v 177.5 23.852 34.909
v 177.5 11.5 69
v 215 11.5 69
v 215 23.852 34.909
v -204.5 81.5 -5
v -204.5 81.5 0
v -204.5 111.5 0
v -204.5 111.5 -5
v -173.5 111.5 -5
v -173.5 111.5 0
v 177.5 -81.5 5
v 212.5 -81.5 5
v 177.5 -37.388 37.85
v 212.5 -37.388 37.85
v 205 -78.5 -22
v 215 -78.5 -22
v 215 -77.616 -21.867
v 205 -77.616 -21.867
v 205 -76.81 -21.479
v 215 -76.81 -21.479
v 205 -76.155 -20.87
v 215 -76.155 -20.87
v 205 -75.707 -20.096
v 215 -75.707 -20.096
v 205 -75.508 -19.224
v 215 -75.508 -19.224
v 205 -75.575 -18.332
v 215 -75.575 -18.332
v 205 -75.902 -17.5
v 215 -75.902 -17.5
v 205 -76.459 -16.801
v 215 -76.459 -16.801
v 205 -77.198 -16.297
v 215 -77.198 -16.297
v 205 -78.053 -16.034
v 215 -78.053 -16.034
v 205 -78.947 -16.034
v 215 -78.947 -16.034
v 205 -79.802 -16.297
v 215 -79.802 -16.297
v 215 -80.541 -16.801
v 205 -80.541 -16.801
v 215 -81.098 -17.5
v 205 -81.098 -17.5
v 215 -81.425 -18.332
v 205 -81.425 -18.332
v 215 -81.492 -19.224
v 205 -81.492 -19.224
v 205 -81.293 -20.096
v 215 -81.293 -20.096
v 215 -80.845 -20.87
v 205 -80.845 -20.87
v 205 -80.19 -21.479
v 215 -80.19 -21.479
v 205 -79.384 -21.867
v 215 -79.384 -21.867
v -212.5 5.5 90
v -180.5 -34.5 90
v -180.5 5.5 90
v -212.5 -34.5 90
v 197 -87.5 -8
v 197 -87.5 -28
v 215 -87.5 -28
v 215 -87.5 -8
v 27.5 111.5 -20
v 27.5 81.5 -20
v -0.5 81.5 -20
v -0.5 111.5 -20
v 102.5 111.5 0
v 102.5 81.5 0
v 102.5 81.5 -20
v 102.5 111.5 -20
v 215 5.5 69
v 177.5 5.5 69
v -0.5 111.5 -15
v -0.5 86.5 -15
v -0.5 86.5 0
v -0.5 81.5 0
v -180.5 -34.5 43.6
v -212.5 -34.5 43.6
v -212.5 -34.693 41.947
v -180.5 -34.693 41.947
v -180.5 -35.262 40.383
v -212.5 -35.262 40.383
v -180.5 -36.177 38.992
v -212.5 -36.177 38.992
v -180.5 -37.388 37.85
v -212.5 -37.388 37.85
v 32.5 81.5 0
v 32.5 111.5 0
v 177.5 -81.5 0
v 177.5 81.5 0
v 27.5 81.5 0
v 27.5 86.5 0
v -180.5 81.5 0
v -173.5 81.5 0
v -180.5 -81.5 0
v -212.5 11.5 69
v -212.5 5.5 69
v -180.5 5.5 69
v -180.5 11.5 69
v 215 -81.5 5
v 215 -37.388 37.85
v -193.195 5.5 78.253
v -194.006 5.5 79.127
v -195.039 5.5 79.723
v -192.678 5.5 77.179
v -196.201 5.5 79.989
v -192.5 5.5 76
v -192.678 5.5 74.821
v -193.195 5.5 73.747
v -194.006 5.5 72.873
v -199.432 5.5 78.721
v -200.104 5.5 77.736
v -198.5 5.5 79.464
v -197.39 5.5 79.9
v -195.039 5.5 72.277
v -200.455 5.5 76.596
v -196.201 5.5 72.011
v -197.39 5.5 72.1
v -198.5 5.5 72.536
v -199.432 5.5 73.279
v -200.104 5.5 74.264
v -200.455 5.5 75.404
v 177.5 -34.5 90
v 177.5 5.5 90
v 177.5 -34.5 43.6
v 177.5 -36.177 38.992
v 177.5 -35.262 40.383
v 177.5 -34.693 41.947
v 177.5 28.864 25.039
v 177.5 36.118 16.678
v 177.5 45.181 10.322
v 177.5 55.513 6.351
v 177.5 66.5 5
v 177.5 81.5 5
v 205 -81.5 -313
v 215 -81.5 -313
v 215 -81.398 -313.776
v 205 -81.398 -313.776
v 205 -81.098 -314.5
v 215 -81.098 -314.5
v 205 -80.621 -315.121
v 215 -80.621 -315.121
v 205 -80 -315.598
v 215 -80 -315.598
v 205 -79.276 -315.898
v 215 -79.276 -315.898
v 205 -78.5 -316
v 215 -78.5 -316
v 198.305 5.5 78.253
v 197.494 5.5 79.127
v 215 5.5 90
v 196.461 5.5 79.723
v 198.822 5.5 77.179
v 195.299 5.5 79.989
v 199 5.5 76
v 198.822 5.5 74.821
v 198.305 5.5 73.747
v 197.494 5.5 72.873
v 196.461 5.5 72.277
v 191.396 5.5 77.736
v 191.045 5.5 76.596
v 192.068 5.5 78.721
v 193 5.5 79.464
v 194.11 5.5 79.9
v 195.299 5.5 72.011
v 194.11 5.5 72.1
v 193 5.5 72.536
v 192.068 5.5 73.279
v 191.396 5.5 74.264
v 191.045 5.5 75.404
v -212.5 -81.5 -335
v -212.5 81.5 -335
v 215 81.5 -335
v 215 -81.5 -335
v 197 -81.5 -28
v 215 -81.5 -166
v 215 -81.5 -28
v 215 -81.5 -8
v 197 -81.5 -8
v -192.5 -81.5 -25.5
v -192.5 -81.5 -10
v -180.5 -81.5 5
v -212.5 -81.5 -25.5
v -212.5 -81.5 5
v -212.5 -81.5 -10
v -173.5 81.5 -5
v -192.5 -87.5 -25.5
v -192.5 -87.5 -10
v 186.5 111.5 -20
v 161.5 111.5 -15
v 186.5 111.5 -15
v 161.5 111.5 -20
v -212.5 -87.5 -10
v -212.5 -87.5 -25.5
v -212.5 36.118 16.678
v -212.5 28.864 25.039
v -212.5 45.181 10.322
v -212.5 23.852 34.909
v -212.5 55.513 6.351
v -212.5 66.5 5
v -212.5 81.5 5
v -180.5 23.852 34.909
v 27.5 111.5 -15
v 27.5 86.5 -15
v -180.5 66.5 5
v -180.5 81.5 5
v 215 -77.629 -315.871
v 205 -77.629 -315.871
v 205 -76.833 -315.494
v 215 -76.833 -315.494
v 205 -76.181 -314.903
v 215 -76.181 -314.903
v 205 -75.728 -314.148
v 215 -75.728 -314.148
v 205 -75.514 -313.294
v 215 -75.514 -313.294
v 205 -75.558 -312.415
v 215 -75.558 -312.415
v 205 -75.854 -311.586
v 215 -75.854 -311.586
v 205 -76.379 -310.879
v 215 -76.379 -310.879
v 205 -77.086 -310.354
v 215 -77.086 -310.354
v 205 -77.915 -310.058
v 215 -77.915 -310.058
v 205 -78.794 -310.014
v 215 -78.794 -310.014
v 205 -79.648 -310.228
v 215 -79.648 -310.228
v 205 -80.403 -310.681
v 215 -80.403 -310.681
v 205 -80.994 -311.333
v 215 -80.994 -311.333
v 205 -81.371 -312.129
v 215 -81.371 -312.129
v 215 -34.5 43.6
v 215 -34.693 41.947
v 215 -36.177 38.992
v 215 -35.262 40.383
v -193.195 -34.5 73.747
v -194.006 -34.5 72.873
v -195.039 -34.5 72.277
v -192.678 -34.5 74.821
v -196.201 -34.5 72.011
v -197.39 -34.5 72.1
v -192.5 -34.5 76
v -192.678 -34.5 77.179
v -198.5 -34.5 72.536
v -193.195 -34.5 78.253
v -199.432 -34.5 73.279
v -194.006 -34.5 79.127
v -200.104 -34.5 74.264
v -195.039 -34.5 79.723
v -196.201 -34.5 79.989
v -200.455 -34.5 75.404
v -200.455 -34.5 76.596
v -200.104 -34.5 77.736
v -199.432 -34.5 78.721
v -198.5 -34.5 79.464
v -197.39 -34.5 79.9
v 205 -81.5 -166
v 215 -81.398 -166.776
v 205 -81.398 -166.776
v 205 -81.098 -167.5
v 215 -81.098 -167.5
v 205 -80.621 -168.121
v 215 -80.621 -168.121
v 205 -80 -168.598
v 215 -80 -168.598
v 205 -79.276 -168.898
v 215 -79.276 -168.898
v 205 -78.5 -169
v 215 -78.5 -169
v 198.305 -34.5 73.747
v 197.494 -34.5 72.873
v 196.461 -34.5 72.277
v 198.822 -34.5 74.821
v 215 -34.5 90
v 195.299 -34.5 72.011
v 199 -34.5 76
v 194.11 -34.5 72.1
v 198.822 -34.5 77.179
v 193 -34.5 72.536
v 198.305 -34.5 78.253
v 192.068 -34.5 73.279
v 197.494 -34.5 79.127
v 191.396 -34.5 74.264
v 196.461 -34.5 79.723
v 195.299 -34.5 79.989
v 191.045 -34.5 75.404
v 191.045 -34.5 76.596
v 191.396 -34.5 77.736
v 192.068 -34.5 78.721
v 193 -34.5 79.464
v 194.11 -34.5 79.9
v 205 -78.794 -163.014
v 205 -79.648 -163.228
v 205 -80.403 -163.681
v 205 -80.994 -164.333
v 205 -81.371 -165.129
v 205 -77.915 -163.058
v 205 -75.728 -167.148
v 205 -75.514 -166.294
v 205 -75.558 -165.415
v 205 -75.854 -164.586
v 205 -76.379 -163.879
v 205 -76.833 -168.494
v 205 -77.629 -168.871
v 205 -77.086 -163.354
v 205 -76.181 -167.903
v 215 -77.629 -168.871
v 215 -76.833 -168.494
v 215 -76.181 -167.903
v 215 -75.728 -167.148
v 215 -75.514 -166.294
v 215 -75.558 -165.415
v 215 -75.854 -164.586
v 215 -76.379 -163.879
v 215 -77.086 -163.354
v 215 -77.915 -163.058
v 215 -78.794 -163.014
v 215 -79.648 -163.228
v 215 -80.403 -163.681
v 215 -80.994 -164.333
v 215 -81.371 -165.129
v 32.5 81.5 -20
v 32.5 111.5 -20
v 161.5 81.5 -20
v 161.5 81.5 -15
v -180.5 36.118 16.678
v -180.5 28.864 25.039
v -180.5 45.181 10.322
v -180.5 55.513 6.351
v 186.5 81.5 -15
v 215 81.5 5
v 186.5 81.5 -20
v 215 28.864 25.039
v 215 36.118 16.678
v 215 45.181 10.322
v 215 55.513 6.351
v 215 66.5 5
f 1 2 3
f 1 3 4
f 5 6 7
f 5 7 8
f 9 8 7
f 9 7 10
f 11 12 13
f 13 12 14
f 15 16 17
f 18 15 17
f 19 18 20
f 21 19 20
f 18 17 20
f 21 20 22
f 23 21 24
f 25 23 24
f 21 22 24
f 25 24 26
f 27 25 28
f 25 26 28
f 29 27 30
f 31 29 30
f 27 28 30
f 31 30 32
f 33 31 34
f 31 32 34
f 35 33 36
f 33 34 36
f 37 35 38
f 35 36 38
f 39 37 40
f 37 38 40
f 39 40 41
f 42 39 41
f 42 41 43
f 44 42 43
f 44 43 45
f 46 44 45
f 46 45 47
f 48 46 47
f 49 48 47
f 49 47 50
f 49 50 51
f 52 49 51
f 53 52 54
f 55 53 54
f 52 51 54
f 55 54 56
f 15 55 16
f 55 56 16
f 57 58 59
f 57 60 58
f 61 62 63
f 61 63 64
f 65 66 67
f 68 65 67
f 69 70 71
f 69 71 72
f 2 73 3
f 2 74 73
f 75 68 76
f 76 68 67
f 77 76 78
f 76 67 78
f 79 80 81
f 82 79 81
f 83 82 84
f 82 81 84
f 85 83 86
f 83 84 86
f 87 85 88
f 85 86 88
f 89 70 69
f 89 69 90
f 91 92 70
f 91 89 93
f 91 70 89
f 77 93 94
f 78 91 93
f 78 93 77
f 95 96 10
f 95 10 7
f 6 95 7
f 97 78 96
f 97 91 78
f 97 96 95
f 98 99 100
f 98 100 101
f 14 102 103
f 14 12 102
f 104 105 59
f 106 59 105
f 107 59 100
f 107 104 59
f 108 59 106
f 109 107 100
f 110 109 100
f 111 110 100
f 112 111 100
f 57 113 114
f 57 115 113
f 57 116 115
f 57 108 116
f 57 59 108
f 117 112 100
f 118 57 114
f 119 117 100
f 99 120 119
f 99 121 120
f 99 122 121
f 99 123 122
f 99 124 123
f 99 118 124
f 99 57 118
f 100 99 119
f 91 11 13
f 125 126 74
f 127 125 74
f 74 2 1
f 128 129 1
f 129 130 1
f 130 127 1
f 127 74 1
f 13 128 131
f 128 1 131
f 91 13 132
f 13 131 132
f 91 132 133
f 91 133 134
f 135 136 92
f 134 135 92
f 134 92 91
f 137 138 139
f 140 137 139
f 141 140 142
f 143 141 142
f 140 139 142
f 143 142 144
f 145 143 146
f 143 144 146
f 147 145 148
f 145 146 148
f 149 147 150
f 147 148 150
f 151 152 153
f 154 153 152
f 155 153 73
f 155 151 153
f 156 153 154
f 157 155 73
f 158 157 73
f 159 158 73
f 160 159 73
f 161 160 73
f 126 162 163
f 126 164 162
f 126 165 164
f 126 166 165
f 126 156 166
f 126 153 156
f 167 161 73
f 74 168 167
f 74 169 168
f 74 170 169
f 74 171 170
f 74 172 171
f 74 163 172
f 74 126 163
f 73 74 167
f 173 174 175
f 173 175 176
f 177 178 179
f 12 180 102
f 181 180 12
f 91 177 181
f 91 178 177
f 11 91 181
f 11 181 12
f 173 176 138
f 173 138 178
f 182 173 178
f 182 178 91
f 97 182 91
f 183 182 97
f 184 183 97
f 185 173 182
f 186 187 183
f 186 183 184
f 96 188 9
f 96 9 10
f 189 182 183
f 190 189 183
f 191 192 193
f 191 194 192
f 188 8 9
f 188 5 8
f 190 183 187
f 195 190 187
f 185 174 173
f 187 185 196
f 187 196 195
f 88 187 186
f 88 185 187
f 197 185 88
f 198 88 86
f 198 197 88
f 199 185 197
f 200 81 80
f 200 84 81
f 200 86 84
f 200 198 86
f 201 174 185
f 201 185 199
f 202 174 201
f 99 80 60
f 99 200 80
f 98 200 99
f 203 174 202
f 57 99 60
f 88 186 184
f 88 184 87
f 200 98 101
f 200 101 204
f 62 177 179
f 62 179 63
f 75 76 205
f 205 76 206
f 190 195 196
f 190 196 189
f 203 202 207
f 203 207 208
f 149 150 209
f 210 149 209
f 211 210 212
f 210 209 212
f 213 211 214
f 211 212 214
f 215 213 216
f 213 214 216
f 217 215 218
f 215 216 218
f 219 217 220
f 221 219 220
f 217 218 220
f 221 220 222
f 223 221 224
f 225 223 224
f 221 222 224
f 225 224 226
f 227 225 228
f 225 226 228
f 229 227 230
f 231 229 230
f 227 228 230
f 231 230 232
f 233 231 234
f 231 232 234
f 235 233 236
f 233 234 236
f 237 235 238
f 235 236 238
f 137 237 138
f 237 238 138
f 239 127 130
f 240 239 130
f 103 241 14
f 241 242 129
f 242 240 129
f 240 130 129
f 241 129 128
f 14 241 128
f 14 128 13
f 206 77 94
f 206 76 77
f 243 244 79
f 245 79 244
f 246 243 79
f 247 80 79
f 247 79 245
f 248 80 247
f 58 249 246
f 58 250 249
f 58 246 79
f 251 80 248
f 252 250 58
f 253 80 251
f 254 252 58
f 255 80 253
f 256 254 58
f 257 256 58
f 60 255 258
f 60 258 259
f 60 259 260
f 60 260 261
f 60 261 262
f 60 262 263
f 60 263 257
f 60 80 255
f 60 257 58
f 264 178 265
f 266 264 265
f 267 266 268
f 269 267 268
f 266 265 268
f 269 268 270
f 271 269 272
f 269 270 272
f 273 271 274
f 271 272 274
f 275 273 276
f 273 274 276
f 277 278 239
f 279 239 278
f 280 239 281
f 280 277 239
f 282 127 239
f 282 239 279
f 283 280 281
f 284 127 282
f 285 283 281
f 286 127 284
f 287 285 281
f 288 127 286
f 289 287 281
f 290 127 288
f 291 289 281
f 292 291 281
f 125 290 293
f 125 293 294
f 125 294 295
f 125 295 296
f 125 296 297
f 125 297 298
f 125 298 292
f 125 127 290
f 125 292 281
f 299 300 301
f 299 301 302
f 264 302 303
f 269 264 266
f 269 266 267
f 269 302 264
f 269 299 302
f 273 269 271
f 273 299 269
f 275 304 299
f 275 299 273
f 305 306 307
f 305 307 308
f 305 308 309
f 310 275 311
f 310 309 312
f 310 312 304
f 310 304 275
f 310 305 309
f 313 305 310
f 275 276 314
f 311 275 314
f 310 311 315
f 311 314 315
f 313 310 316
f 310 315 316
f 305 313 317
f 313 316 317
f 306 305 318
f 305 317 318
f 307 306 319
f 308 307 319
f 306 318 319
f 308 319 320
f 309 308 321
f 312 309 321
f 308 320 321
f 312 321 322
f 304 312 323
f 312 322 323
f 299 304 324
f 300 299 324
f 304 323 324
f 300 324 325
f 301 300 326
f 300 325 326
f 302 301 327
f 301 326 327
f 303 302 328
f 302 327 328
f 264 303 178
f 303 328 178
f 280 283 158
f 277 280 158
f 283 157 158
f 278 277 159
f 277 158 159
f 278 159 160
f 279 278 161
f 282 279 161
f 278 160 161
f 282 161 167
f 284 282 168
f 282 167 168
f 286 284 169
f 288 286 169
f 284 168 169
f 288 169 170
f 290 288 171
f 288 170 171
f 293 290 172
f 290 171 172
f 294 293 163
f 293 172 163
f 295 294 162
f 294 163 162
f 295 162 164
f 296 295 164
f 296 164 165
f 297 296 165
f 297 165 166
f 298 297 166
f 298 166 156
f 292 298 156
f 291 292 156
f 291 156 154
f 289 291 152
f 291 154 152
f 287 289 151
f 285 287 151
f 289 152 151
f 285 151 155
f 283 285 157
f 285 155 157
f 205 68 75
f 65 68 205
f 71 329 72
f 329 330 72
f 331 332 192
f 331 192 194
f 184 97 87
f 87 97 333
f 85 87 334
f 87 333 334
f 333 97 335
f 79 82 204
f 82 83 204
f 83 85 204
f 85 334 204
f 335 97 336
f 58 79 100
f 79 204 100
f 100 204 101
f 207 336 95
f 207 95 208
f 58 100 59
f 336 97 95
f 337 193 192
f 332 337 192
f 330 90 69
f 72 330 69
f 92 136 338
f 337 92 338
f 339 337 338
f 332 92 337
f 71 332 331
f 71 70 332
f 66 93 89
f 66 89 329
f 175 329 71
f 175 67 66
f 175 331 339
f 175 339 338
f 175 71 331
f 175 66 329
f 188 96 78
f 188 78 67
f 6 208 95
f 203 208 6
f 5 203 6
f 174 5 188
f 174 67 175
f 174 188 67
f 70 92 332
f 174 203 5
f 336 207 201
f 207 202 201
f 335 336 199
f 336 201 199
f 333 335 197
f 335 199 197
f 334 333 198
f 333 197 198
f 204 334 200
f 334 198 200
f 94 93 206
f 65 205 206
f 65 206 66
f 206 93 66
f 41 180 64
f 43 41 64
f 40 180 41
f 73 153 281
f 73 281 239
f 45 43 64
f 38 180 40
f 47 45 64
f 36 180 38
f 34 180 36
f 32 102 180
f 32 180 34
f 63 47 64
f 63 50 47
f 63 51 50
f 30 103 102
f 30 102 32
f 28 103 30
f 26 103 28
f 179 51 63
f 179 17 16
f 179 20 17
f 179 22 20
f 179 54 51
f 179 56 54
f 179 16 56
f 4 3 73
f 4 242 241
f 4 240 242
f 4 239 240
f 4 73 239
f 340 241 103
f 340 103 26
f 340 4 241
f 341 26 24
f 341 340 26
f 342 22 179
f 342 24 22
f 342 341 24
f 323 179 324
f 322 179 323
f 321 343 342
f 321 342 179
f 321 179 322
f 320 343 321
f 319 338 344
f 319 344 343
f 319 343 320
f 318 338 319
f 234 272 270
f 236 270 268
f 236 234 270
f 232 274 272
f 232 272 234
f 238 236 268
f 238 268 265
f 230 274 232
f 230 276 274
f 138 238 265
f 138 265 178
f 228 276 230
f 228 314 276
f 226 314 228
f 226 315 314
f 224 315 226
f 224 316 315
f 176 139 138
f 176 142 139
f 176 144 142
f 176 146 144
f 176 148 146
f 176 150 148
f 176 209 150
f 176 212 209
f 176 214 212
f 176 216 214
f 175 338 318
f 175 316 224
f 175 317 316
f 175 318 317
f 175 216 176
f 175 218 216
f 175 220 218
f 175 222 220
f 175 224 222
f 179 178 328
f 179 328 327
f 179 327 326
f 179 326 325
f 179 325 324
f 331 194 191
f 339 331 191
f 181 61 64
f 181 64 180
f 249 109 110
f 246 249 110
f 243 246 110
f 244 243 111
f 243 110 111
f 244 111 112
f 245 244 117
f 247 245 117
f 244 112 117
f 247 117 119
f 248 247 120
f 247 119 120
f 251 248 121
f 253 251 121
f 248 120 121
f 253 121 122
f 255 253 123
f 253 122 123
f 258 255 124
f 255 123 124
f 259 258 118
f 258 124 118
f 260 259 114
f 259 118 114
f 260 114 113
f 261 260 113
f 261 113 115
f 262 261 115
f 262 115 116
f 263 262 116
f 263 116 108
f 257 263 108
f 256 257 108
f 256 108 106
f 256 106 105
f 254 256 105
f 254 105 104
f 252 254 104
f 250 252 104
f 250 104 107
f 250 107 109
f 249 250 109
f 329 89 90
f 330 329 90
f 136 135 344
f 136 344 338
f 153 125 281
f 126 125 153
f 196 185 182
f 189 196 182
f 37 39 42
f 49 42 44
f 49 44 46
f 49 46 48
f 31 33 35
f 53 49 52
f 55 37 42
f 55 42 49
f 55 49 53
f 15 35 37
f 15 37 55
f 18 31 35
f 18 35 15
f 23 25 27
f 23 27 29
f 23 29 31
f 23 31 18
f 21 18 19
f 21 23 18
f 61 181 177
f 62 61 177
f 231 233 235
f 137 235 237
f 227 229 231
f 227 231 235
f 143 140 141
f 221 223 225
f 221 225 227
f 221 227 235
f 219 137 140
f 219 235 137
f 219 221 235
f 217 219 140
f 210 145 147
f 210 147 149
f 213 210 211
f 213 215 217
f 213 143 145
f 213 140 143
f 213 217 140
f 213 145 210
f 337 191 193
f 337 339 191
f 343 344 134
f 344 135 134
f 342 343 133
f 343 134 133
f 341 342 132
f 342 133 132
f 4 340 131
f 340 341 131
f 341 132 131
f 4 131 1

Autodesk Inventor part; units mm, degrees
ref_plane "YZ Plane" through (0, 0, 0) normal (1, 0, 0) x (0, 1, 0)
ref_plane "XZ Plane" through (0, 0, 0) normal (0, 1, 0) x (-1, 0, 0)
ref_plane "XY Plane" through (0, 0, 0) normal (0, 0, 1) x (1, 0, 0)
sketch "Sketch1" plane through (0, 0, 0) normal (0, 0, 1) x (1, 0, 0)
  line L0 (-212.5, -81.5) -> (212.5, -81.5)
  line L1 (212.5, -81.5) -> (212.5, 81.5)
  line L2 (212.5, 81.5) -> (-212.5, 81.5)
  line L3 (-212.5, 81.5) -> (-212.5, -81.5)
  line L4 (-212.5, -81.5) -> (212.5, 81.5) construction
  line L5 (212.5, -81.5) -> (-212.5, 81.5) construction
  point P0 (0, 0)
  dimension "d0" = 163
  dimension "d1" = 425
extrude "Extrusion1" add sketch "Sketch1" against normal blind 335
sketch "Sketch2" plane through (-212.5, -81.5, 0) normal (0, -1, 0) x (1, 0, 0)
  line L0 (0, 0) -> (425, 0) construction
  line L1 (425, -8) -> (409.5, -8)
  line L2 (409.5, -8) -> (409.5, -28)
  line L3 (409.5, -28) -> (425, -28)
  line L4 (425, -28) -> (425, -8)
  line L5 (20, -10) -> (0, -10)
  line L6 (0, -10) -> (0, -25.5)
  line L7 (0, -25.5) -> (20, -25.5)
  line L8 (20, -25.5) -> (20, -10)
  line L9 (0, -10) -> (0, 0) construction
  line L10 (425, -8) -> (425, 0) construction
  point P0 (212.5, 0)
  dimension "d4" = 8
  dimension "d5" = 10
  dimension "d6" = 15.5
  dimension "d7" = 20
  dimension "d8" = 15.5
  dimension "d9" = 20
extrude "Extrusion2" add sketch "Sketch2" along normal blind 6
sketch "Sketch3" plane through (212.5, -81.5, 0) normal (1, 0, 0) x (0, 0, -1)
  line L0 (0, 0) -> (0, 163) projected
  line L1 (0, 0) -> (-5, 0)
  line L2 (-5, 0) -> (-40, 47)
  line L3 (-40, 47) -> (-90, 47)
  line L4 (-90, 47) -> (-90, 87)
  line L5 (-90, 87) -> (-69, 87)
  line L6 (-69, 93) -> (-34.909, 105.3518)
  line L7 (-69, 87) -> (-69, 93)
  arc A0 (-34.909, 105.3518) -> (-5, 148) centre (-50.3612, 148) ccw
  line L8 (-34.909, 105.3518) -> (0, 118) construction
  arc A1 (-37.8496, 44.1124) -> (-43.6003, 47) centre (-43.6003, 39.8299) ccw
  line L9 (-5, 148) -> (-5, 163)
  line L10 (-5, 163) -> (0, 163)
  dimension "d12" = 5
  dimension "d13" = 47
  dimension "d14" = 35
  dimension "d15" = 40
  dimension "d16" = 90
  dimension "d17" = 118
  dimension "d18" = 93
  dimension "d19" = 69
  dimension "d23" = 55
  dimension "d26" = 5
  dimension "d27" = 15
extrude "Extrusion3" add sketch "Sketch3" against normal blind 35
sketch "Sketch4" plane through (-212.5, -81.5, 0) normal (-1, 0, 0) x (0, 0, 1)
  line L0 (0, 0) -> (0, 163) projected
  line L1 (0, 0) -> (5, 0) projected
  line L2 (5, 0) -> (37.8496, 44.1124) projected
  arc A0 (43.6003, 47) -> (37.8496, 44.1124) centre (43.6003, 39.8299) ccw projected
  line L3 (43.6003, 47) -> (90, 47) projected
  line L4 (90, 47) -> (90, 87) projected
  line L5 (90, 87) -> (69, 87) projected
  line L6 (69, 87) -> (69, 93) projected
  line L7 (69, 93) -> (34.909, 105.3518) projected
  arc A1 (5, 148) -> (34.909, 105.3518) centre (50.3612, 148) ccw projected
  line L8 (5, 148) -> (5, 163) projected
  line L9 (5, 163) -> (0, 163) projected
  point P0 (0, 81.5)
extrude "Extrusion4" add sketch "Sketch4" against normal blind 32
sketch "Sketch5" plane through (-212.5, 81.5, -335) normal (0, 1, 0) x (1, 0, 0)
  line L0 (390, -335) -> (32, -335) projected
  line L1 (32, -335) -> (8, -335)
  line L2 (8, -335) -> (8, -330)
  line L3 (8, -330) -> (39, -330)
  line L4 (39, -330) -> (39, -335)
  line L5 (0, 0) -> (0, -340) construction
  point P0 (212.5, -335)
  dimension "d28" = 39
  dimension "d29" = 5
  dimension "d30" = 8
extrude "Extrusion5" add sketch "Sketch5" along normal blind 30
sketch "Sketch6" plane through (-212.5, 81.5, -335) normal (0, 1, 0) x (1, 0, 0)
  line L0 (0, 0) -> (0, -340) construction
  line L1 (390, -335) -> (39, -335) projected
  line L2 (212, -335) -> (212, -315)
  line L3 (212, -315) -> (240, -315)
  line L4 (240, -315) -> (240, -335)
  point P0 (212.5, -335)
  dimension "d33" = 212
  dimension "d34" = 240
  dimension "d35" = 20
extrude "Extrusion6" add sketch "Sketch6" along normal blind 5
sketch "Sketch7" plane through (0, 0, 0) normal (0, 0, 1) x (1, 0, 0)
  line L0 (177.5, 81.5) -> (27.5, 81.5) projected
  line L1 (32.5, 81.5) -> (32.5, 111.5)
  line L2 (-212.5, -81.5) -> (-212.5, 81.5) construction
  line L3 (102.5, 81.5) -> (102.5, 111.5)
  line L4 (32.5, 111.5) -> (102.5, 111.5)
  point P0 (0, 0)
  dimension "d38" = 245
  dimension "d39" = 315
  dimension "d40" = 30
extrude "Extrusion7" add sketch "Sketch7" against normal blind 20
sketch "Sketch8" plane through (-212.5, 81.5, -335) normal (0, 1, 0) x (1, 0, 0)
  line L0 (0, 0) -> (0, -340) construction
  line L1 (374, -315) -> (399, -315)
  line L2 (399, -315) -> (399, -320)
  line L3 (399, -320) -> (374, -320)
  line L4 (374, -320) -> (374, -315)
  line L5 (390, -335) -> (315, -335) construction
  point P0 (212.5, -335)
  dimension "d43" = 374
  dimension "d44" = 399
  dimension "d45" = 15
  dimension "d46" = 20
extrude "Extrusion8" add sketch "Sketch8" along normal blind 30
sketch "Sketch9" plane through (-212.5, 86.5, -335) normal (0, 1, 0) x (1, 0, 0)
  line L0 (240, -315) -> (212, -315) projected
  line L1 (240, -335) -> (240, -315) projected
  line L2 (212, -320) -> (240, -320)
  line L3 (212, -315) -> (212, -320)
  line L4 (8, -330) -> (8, -335) construction
  point P0 (212.5, -335)
extrude "Extrusion9" add sketch "Sketch9" along normal up to surface (25 mm away)
sketch "Sketch10" plane through (-212.5, 5.5, 90) normal (0, 1, 0) x (1, 0, 0)
  line L0 (0, 0) -> (32, 0) projected
  line L1 (425, 0) -> (390, 0) projected
  circle A0 centre (16, 14) radius 4
  circle A1 centre (407.5, 14) radius 4
  line L2 (390, 0) -> (407.5, 14) construction
  line L3 (407.5, 14) -> (425, 0) construction
  line L4 (32, 0) -> (16, 14) construction
  line L5 (16, 14) -> (0, 0) construction
  line L6 (16, 14) -> (407.5, 14) construction
  point P0 (212.5, 90)
  dimension "d51" = 8
  dimension "d52" = 14
extrude "Extrusion10" cut sketch "Sketch10" against normal up to surface (40 mm away)
sketch "Sketch11" plane through (212.5, -81.5, -335) normal (1, 0, 0) x (0, 0, -1)
  line L0 (-327, -6) -> (-327, 0) projected
  line L1 (-327, 0) -> (-340, 0) projected
  line L2 (-340, 0) -> (-372.8496, 44.1124) projected
  arc A0 (-372.8496, 44.1124) -> (-378.6003, 47) centre (-378.6003, 39.8299) ccw projected
  line L3 (-378.6003, 47) -> (-425, 47) projected
  line L4 (-425, 47) -> (-425, 87) projected
  line L5 (-425, 87) -> (-404, 87) projected
  line L6 (-404, 87) -> (-404, 93) projected
  line L7 (-404, 93) -> (-369.909, 105.3518) projected
  arc A1 (-369.909, 105.3518) -> (-340, 148) centre (-385.3612, 148) ccw projected
  line L8 (-340, 148) -> (-340, 163) projected
  line L9 (-340, 163) -> (0, 163) projected
  line L10 (0, 163) -> (0, 0) projected
  line L11 (0, 0) -> (-307, 0) projected
  line L12 (-307, 0) -> (-307, -6) projected
  line L13 (-307, -6) -> (-327, -6) projected
  point P0 (-335, 81.5)
extrude "Extrusion11" add sketch "Sketch11" along normal blind 2.5
sketch "Sketch12" plane through (215, -81.5, -335) normal (1, 0, 0) x (0, 0, -1)
  line L0 (-415, 87) -> (-407, 87) construction
  line L1 (-411, 87) -> (-411, 3) construction
  line L2 (-411, 3) -> (-316, 3) construction
  line L3 (-316, 3) -> (-169, 3) construction
  line L4 (-169, 3) -> (-22, 3) construction
  circle A0 centre (-316, 3) radius 3
  circle A1 centre (-169, 3) radius 3
  circle A2 centre (-22, 3) radius 3
  line L5 (-327, -6) -> (-307, -6) projected
  point P0 (-335, 81.5)
  dimension "d57" = 95
  dimension "d58" = 242
  dimension "d59" = 389
  dimension "d60" = 6
  dimension "d63" = 9
extrude "Extrusion12" cut sketch "Sketch12" against normal blind 10
properties part number "IMA Battery Case Primitive"
